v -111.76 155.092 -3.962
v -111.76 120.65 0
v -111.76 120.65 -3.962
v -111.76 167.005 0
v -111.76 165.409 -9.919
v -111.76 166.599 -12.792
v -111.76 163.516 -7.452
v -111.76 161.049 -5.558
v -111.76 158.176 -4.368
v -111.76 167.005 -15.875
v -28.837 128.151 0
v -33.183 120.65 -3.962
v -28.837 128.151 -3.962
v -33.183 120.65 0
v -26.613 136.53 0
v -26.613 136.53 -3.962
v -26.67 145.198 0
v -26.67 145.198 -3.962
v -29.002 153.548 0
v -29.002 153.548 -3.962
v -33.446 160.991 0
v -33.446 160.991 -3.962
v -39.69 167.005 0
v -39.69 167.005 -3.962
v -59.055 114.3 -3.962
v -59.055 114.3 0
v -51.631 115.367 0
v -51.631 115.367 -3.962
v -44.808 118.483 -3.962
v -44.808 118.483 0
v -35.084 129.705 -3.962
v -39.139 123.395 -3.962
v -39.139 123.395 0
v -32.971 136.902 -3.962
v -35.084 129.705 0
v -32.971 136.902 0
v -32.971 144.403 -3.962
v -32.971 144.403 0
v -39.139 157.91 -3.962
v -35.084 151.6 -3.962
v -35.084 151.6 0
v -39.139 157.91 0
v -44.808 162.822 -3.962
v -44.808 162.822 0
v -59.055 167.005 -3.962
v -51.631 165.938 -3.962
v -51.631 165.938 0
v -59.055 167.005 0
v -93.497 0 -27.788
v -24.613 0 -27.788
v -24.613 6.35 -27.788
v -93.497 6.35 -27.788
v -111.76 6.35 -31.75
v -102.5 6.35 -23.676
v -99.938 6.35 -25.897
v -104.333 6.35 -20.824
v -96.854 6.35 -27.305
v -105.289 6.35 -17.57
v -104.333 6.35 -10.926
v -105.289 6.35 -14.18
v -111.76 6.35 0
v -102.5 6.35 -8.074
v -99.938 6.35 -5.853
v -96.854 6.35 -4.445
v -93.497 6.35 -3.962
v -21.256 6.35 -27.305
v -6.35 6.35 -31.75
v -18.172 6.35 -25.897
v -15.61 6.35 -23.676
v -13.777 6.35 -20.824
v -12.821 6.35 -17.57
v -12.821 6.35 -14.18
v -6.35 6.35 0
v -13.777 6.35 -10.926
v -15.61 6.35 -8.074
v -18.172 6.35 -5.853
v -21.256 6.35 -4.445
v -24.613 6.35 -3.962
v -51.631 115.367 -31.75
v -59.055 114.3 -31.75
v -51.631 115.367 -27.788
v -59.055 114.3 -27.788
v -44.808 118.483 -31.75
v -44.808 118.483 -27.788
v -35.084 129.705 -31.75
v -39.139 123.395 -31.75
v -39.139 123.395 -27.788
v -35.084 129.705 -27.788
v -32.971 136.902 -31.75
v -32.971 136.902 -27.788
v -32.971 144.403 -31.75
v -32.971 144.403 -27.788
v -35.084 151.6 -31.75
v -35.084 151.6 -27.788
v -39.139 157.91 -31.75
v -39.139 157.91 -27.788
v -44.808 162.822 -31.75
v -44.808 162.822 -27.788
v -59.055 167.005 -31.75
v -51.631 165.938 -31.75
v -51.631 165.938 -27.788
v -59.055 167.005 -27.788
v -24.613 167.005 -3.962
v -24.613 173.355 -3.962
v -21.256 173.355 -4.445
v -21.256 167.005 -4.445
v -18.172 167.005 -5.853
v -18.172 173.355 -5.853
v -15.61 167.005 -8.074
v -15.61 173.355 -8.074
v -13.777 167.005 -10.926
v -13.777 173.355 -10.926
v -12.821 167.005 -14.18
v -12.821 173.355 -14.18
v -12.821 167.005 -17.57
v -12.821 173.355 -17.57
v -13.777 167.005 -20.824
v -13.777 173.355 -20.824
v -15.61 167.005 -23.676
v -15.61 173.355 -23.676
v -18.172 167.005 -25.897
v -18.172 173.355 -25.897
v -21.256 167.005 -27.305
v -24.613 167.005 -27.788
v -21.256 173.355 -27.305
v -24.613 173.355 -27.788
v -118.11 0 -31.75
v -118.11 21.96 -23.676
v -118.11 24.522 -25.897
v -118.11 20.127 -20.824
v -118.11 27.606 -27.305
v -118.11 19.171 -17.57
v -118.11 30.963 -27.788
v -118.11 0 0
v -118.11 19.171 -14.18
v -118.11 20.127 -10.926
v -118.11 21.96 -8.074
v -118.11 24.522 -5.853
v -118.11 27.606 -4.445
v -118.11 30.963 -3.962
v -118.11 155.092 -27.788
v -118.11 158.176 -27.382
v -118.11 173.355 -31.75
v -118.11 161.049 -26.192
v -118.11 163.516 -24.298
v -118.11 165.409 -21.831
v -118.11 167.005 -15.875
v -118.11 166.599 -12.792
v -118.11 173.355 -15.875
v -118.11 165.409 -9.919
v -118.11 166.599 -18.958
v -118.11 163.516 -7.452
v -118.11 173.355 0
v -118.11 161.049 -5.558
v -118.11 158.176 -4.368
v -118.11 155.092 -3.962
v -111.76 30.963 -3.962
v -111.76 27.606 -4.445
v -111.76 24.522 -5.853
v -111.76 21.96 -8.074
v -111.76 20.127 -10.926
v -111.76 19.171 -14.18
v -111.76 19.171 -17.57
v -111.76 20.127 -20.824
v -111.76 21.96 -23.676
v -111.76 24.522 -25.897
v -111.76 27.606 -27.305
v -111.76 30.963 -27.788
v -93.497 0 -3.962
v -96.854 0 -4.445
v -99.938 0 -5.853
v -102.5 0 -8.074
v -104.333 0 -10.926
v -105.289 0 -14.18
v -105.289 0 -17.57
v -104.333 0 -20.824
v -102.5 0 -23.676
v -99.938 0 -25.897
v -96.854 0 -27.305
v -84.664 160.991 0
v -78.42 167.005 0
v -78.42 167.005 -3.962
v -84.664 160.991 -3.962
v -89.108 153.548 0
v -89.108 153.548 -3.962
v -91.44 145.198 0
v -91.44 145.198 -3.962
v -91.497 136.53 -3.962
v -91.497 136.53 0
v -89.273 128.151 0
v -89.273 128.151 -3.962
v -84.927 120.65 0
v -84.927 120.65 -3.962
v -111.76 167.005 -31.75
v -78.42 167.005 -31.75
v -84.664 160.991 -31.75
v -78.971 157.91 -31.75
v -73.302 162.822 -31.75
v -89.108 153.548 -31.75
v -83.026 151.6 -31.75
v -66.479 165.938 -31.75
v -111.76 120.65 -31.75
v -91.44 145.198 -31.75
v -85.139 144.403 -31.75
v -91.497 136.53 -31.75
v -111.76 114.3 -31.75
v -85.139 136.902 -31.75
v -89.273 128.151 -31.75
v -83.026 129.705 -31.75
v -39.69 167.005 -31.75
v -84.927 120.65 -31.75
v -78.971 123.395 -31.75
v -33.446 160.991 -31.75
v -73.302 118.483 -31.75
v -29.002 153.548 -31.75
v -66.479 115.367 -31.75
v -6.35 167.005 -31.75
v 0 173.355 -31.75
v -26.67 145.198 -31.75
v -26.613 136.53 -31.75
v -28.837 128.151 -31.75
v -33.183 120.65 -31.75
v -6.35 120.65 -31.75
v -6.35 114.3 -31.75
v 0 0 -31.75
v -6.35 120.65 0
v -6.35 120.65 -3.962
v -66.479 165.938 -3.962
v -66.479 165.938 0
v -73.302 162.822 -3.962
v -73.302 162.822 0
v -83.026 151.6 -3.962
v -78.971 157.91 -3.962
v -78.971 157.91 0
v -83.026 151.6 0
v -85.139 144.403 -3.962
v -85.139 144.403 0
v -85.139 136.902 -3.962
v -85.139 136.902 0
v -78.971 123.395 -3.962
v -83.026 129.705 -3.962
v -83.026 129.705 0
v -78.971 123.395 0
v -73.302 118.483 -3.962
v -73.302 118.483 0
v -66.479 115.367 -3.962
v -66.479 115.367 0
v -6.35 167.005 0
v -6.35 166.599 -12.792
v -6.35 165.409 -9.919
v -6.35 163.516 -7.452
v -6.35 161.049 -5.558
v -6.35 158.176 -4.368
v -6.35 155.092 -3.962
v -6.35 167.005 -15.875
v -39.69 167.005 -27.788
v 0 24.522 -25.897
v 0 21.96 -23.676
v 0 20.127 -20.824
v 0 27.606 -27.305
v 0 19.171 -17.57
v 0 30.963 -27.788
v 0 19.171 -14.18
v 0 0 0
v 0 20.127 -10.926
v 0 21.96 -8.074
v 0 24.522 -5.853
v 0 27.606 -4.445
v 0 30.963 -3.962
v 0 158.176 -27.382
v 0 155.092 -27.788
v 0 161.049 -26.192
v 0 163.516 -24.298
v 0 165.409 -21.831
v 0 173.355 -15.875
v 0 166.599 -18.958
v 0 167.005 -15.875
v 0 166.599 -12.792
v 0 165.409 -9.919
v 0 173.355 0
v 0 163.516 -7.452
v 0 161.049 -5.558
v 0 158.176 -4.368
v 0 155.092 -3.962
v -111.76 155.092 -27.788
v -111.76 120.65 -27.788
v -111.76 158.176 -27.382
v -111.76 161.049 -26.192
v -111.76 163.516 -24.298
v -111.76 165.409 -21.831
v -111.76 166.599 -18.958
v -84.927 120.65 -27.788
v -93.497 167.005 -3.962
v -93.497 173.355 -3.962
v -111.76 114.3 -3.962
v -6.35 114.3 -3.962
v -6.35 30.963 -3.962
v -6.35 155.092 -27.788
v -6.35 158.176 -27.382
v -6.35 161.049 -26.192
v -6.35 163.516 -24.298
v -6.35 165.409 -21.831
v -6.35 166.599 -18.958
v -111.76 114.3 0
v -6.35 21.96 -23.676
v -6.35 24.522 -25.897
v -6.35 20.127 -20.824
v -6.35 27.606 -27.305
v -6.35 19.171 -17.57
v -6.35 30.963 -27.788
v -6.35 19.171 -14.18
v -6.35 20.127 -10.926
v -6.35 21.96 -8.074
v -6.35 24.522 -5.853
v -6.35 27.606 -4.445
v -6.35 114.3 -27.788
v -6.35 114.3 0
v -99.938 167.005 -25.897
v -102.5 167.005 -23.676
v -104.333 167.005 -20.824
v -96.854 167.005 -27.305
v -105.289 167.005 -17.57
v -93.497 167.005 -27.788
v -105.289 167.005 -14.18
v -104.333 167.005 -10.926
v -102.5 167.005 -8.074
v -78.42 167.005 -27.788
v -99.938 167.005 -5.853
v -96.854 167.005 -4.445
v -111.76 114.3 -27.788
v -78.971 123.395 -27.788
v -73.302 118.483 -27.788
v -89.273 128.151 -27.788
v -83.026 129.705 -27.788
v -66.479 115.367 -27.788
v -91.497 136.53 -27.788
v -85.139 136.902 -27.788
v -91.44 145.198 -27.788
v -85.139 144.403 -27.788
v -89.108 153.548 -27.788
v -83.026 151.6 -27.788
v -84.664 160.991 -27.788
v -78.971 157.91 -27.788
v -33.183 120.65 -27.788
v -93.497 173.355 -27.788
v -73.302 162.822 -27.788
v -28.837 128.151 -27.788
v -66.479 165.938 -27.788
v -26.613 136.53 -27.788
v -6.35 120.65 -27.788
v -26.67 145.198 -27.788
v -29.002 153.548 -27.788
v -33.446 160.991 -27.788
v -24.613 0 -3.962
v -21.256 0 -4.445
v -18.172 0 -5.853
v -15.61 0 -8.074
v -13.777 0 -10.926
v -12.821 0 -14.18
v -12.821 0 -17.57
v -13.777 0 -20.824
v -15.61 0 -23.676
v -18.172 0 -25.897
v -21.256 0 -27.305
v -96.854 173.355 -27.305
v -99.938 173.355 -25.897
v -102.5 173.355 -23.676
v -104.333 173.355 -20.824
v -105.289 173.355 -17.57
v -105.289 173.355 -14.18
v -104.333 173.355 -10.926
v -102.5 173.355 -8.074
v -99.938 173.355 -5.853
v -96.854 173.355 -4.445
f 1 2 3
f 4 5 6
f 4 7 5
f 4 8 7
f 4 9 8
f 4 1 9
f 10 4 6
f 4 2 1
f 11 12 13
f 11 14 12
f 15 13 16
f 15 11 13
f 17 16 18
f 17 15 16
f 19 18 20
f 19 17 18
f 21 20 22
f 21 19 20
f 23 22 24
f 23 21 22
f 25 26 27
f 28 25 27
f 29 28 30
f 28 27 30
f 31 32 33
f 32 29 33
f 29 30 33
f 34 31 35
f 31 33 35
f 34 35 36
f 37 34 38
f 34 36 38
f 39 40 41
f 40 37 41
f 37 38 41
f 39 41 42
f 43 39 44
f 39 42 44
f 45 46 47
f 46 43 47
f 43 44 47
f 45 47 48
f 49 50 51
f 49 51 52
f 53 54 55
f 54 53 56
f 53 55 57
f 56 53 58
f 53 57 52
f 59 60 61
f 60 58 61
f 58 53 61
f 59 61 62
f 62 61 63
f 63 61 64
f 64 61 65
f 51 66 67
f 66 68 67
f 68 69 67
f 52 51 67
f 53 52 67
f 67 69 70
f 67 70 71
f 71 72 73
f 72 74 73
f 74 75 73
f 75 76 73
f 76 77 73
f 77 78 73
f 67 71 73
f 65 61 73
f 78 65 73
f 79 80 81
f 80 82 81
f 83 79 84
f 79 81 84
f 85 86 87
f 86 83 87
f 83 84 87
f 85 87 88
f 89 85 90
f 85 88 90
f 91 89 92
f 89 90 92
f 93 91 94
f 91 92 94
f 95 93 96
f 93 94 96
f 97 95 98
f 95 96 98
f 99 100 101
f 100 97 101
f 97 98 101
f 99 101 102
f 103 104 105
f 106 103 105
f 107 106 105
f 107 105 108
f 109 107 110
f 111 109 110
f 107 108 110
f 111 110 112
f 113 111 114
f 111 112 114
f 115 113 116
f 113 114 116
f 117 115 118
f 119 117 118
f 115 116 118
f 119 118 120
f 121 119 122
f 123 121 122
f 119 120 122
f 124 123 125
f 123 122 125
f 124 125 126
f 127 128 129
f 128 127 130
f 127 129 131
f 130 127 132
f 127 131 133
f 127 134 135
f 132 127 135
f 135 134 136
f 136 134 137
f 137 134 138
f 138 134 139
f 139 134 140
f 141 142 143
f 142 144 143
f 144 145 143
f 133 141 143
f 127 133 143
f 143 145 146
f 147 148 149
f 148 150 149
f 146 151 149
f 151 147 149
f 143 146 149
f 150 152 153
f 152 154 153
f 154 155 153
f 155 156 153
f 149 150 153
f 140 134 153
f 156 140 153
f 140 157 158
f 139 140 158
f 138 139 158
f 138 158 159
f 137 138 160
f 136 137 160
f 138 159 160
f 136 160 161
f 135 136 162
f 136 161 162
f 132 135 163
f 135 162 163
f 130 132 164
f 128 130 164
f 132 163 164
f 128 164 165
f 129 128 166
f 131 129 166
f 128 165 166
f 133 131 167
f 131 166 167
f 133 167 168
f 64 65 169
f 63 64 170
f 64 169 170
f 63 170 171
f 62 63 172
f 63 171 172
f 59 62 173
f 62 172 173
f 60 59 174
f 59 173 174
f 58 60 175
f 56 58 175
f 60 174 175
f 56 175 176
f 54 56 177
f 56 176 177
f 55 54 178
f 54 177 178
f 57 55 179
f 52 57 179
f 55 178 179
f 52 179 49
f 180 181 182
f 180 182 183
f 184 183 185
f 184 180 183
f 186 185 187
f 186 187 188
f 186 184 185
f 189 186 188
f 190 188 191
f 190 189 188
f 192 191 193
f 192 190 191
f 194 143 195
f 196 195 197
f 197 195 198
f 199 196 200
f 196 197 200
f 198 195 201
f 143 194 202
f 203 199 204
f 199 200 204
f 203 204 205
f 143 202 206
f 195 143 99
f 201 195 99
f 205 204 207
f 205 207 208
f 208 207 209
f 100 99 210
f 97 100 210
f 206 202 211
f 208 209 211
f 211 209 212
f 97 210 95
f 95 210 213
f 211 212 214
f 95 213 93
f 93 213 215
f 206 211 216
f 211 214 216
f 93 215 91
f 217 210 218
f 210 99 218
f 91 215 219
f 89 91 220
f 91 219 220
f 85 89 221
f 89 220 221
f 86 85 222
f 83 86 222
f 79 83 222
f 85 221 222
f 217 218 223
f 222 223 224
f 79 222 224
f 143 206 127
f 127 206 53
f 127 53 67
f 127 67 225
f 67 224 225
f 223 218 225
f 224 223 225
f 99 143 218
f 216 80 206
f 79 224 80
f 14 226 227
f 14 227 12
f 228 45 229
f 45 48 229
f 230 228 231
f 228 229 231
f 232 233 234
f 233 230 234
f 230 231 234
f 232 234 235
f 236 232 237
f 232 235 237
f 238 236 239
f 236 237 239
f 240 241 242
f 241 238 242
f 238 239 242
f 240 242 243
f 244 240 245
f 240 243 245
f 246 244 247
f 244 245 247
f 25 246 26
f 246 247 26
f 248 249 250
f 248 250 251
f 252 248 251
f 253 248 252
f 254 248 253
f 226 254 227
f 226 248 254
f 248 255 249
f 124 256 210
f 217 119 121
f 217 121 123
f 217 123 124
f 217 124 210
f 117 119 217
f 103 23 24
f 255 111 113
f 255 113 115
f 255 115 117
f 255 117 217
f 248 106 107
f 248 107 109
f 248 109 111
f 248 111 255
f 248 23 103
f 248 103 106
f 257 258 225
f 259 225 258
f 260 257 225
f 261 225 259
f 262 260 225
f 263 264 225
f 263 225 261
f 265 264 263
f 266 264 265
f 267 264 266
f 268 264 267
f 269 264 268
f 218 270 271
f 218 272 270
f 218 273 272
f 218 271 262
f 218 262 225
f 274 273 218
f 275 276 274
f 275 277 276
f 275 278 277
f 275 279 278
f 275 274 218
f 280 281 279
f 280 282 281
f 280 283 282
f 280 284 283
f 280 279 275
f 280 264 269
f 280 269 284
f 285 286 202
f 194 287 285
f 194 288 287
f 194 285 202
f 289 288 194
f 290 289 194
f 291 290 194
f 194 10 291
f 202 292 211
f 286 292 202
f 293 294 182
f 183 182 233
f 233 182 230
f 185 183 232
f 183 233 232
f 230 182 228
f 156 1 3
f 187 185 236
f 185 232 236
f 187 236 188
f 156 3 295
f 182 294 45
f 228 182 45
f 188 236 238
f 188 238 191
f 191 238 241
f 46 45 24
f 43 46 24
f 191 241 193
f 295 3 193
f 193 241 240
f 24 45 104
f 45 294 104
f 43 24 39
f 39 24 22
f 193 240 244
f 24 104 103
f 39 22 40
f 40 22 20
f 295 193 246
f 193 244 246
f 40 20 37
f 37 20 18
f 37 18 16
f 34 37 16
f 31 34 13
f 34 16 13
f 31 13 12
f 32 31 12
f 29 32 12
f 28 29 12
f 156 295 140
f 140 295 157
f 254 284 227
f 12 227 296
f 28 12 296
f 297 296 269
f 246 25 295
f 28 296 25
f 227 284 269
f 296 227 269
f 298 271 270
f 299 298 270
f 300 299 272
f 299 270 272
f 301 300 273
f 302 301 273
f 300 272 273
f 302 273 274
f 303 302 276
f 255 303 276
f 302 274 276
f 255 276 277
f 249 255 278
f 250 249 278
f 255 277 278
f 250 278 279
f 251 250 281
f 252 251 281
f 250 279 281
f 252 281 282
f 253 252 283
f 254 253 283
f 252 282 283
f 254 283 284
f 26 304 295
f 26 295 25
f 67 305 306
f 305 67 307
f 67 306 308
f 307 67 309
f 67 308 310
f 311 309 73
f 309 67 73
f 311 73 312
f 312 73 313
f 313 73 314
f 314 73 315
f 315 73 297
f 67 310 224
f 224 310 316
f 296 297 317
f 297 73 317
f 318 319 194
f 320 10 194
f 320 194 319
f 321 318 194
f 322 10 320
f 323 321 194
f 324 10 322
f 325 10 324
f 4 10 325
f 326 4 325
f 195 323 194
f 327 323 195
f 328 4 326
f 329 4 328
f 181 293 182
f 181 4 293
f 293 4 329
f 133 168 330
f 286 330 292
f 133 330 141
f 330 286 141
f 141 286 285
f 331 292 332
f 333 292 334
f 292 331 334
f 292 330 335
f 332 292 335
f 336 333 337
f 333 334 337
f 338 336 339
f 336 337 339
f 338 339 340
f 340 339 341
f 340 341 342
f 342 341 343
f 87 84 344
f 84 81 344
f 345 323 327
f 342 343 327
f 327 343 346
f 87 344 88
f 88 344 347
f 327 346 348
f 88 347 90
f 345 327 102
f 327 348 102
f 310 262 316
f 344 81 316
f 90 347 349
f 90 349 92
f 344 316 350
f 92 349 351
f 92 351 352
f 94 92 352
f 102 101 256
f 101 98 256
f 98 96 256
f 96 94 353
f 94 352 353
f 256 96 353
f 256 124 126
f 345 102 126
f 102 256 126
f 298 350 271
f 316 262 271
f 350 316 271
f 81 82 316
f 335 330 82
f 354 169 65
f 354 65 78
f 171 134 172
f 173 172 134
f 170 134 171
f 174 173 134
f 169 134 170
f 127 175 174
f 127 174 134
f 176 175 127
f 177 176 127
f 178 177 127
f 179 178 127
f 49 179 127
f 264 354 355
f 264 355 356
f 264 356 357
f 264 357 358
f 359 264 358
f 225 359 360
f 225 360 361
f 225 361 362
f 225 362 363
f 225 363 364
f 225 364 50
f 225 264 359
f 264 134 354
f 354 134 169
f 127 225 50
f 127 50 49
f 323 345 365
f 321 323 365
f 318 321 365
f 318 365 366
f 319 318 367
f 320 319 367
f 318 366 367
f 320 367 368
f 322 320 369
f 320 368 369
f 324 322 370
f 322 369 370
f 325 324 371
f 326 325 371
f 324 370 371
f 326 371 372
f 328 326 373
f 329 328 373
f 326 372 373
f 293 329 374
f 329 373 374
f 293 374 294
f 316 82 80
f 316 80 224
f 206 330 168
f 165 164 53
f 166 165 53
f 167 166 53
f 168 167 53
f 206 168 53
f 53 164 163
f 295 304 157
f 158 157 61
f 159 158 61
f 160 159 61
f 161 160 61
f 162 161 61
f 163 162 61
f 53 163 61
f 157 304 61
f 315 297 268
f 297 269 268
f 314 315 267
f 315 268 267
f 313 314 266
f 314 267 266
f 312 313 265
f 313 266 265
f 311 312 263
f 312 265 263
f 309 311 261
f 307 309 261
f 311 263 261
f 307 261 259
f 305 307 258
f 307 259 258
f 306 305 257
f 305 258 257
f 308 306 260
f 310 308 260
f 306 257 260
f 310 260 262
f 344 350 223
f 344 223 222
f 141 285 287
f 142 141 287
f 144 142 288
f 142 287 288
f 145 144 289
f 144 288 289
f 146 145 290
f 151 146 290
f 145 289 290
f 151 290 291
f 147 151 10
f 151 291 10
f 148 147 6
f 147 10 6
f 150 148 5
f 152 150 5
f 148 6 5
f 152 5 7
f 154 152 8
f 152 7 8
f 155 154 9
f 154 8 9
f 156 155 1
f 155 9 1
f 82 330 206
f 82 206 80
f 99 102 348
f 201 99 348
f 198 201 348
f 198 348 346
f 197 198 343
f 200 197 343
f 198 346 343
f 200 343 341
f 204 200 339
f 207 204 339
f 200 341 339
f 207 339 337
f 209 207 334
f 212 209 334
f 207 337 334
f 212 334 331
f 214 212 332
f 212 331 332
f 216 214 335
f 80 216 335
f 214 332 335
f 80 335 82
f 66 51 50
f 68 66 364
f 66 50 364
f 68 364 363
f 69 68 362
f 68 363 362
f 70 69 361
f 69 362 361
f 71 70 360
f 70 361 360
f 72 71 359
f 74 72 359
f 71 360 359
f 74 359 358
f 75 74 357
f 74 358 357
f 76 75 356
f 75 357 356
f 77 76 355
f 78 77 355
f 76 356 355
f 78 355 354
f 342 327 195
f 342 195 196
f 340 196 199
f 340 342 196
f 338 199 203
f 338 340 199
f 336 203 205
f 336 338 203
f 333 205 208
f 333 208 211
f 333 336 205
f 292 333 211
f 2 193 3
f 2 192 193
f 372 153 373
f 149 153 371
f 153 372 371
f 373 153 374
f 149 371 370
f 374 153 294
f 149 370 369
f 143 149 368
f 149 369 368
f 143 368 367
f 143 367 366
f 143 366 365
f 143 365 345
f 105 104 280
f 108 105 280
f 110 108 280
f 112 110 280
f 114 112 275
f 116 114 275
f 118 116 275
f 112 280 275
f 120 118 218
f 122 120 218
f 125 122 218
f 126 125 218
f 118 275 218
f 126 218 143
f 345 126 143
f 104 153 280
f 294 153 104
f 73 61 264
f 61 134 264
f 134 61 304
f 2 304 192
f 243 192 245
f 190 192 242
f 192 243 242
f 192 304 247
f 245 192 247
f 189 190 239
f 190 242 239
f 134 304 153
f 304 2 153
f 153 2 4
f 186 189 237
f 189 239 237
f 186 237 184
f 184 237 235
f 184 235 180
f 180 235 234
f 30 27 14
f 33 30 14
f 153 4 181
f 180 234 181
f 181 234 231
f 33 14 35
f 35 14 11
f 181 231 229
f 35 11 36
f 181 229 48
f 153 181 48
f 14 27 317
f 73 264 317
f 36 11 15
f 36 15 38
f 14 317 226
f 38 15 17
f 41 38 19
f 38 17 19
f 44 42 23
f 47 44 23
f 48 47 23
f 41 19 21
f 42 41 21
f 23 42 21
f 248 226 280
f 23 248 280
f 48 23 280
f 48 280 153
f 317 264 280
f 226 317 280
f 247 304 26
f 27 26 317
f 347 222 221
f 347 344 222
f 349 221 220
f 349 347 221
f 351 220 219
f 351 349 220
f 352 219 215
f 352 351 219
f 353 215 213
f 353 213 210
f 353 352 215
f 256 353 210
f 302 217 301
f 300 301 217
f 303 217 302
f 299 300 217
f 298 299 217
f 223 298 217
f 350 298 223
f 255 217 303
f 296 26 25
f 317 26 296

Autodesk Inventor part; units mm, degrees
ref_plane "YZ Plane" through (0, 0, 0) normal (1, 0, 0) x (0, 1, 0)
ref_plane "XZ Plane" through (0, 0, 0) normal (0, 1, 0) x (-1, 0, 0)
ref_plane "XY Plane" through (0, 0, 0) normal (0, 0, 1) x (1, 0, 0)
sketch "Sketch1" plane through (0, 0, 0) normal (1, 0, 0) x (0, 1, 0)
  line L0 (0, 0) -> (0, -31.75)
  line L1 (0, 0) -> (173.355, 0)
  line L2 (0, 0) -> (173.355, 0)
  line L3 (173.355, 0) -> (173.355, -31.75)
  line L4 (173.355, -31.75) -> (0, -31.75)
  line L5 (0, -31.75) -> (0, 0)
  line L6 (0, -15.875) -> (6.35, -15.875)
  line L7 (173.355, -15.875) -> (167.005, -15.875)
  arc A0 (155.0924, -27.7876) -> (155.0924, -3.9624) centre (155.0924, -15.875) ccw
  line L8 (155.0924, -3.9624) -> (30.9626, -3.9624)
  line L9 (30.9626, -27.7876) -> (155.0924, -27.7876)
  arc A1 (30.9626, -3.9624) -> (30.9626, -27.7876) centre (30.9626, -15.875) ccw
  dimension "d0" = 31.75
  dimension "d1" = 173.355
  dimension "d2" = 6.35
  dimension "d3" = 6.35
extrude "Extrusion1" add sketch "Sketch1" against normal blind 118.11
sketch "Sketch2" plane through (0, 0, 0) normal (0, 0, 1) x (1, 0, 0)
  line L0 (0, 173.355) -> (0, 0) projected
  line L1 (0, 173.355) -> (-118.11, 173.355) projected
  line L2 (-118.11, 0) -> (-118.11, 173.355) projected
  line L3 (0, 0) -> (-118.11, 0) projected
  line L4 (-6.35, 6.35) -> (-6.35, 167.005)
  line L5 (-6.35, 167.005) -> (-111.76, 167.005)
  line L6 (-111.76, 167.005) -> (-111.76, 6.35)
  line L7 (-111.76, 6.35) -> (-6.35, 6.35)
  dimension "d9" = 6.35
extrude "Extrusion2" cut sketch "Sketch2" against normal blind 118.11 contours L7 L6 L5 L4
sketch "Sketch3" plane through (0, 0, 0) normal (0, 0, 1) x (1, 0, 0)
  point P0 (0, 0)
sketch "Sketch4" plane through (0, 0, 0) normal (0, 0, 1) x (1, 0, 0)
  line L0 (-111.76, 167.005) -> (-6.35, 167.005) projected
  circle A0 centre (-59.055, 140.6525) radius 26.3525
  line L1 (-111.76, 30.9626) -> (-111.76, 155.0924) projected
  line L2 (-111.76, 114.3) -> (-6.35, 114.3)
  line L3 (-6.35, 114.3) -> (-6.35, 167.005)
  line L4 (-6.35, 167.005) -> (-111.76, 167.005)
  line L5 (-111.76, 167.005) -> (-111.76, 114.3)
  point P0 (0, 0)
  point P1 (-59.055, 167.005)
  point P2 (-59.055, 114.3)
extrude "Extrusion3" add sketch "Sketch4" against normal blind 31.75 contours L0 A0 L2 L1 L5 | L0 L3 L2 A0
sketch "Sketch5" plane through (0, 0, 0) normal (1, 0, 0) x (0, 0, -1)
  line L0 (0, 173.355) -> (0, 0) projected
  line L1 (0, 0) -> (31.75, 0) projected
  line L2 (31.75, 0) -> (31.75, 173.355) projected
  line L3 (31.75, 173.355) -> (0, 173.355) projected
  arc A0 (27.7876, 155.0924) -> (3.9624, 155.0924) centre (15.875, 155.0924) ccw projected
  line L4 (27.7876, 155.0924) -> (27.7876, 30.9626) projected
  arc A1 (3.9624, 30.9626) -> (27.7876, 30.9626) centre (15.875, 30.9626) ccw projected
  line L5 (3.9624, 30.9626) -> (3.9624, 155.0924) projected
extrude "Extrusion4" cut sketch "Sketch5" against normal through all contours L4 A1 L5 A0
sketch "Sketch6" plane through (0, 0, -31.75) normal (0, -1, 0) x (1, 0, 0)
  line L0 (-118.11, 3.9624) -> (-118.11, 27.7876) projected
  line L1 (0, 27.7876) -> (0, 3.9624) projected
  line L2 (-81.0991, 27.7876) -> (-118.11, 27.7876) projected
  line L3 (-99.6046, 27.7876) -> (-18.2626, 27.7876)
  line L4 (-6.35, 3.9624) -> (-59.055, 3.9624) projected
  line L5 (-18.2626, 3.9624) -> (-99.6046, 3.9624)
  line L6 (-81.0991, 3.9624) -> (-118.11, 3.9624) projected
  line L7 (0, 0) -> (0, 31.75) projected
  line L8 (0, 15.875) -> (-12.7, 15.875)
  line L9 (-118.11, 0) -> (-118.11, 31.75) projected
  line L10 (-118.11, 15.875) -> (-105.41, 15.875)
  arc A0 (-24.6126, 3.9624) -> (-24.6126, 27.7876) centre (-24.6126, 15.875) ccw
  arc A1 (-93.4974, 27.7876) -> (-93.4974, 3.9624) centre (-93.4974, 15.875) ccw
  dimension "d21" = 12.7
  dimension "d22" = 12.7
extrude "Extrusion5" cut sketch "Sketch6" against normal blind 31.75 contours A1 L2 L3 A0 L4 L5
sketch "Sketch7" plane through (0, 173.355, 0) normal (0, 1, 0) x (1, 0, 0)
  line L0 (-24.6126, 3.9624) -> (-93.4974, 3.9624) projected
  line L1 (-93.4974, 27.7876) -> (-24.6126, 27.7876) projected
  arc A0 (-93.4974, 27.7876) -> (-93.4974, 3.9624) centre (-93.4974, 15.875) ccw projected
  arc A1 (-24.6126, 3.9624) -> (-24.6126, 27.7876) centre (-24.6126, 15.875) ccw projected
  point P0 (0, 0)
extrude "Extrusion6" cut sketch "Sketch7" against normal blind 31.75
sketch "Sketch8" plane through (0, 0, 0) normal (0, 0, 1) x (1, 0, 0)
  line L0 (-111.76, 6.35) -> (-111.76, 114.3) projected
  line L1 (-111.76, 114.3) -> (-59.055, 114.3) projected
  circle A0 centre (-59.055, 140.6525) radius 26.3525 projected
  line L2 (-59.055, 114.3) -> (-6.35, 114.3) projected
  line L3 (-6.35, 114.3) -> (-6.35, 6.35) projected
  line L4 (-6.35, 6.35) -> (-111.76, 6.35) projected
  line L5 (0, 173.355) -> (0, 0) projected
  line L6 (0, 173.355) -> (-118.11, 173.355) projected
  line L7 (-118.11, 0) -> (-118.11, 173.355) projected
  line L8 (0, 0) -> (-118.11, 0) projected
  line L9 (-59.055, 120.65) -> (-118.11, 120.65)
  line L10 (-118.11, 120.65) -> (-118.11, 0)
  line L11 (-118.11, 0) -> (0, 0)
  line L12 (0, 0) -> (0, 120.65)
  line L13 (0, 120.65) -> (-59.055, 120.65)
  line L14 (-111.76, 167.005) -> (-6.35, 167.005)
  line L15 (-6.35, 167.005) -> (-6.35, 6.35)
  line L16 (-6.35, 6.35) -> (-111.76, 6.35)
  line L17 (-111.76, 6.35) -> (-111.76, 167.005)
  circle A1 centre (-59.055, 140.6525) radius 32.7025
  point P0 (-39.6901, 167.005)
  point P1 (-33.1831, 120.65)
  point P2 (-6.35, 120.65)
  point P3 (-84.9269, 120.65)
  point P4 (-78.4199, 167.005)
  point P5 (-111.76, 120.65)
  dimension "d27" = 6.35
  dimension "d28" = 6.35
  dimension "d29" = 6.35
extrude "Extrusion7" cut sketch "Sketch8" against normal through all contours L17 L14 A1 L9 | L13 A1 L14 L15
properties part number "box rim big"
